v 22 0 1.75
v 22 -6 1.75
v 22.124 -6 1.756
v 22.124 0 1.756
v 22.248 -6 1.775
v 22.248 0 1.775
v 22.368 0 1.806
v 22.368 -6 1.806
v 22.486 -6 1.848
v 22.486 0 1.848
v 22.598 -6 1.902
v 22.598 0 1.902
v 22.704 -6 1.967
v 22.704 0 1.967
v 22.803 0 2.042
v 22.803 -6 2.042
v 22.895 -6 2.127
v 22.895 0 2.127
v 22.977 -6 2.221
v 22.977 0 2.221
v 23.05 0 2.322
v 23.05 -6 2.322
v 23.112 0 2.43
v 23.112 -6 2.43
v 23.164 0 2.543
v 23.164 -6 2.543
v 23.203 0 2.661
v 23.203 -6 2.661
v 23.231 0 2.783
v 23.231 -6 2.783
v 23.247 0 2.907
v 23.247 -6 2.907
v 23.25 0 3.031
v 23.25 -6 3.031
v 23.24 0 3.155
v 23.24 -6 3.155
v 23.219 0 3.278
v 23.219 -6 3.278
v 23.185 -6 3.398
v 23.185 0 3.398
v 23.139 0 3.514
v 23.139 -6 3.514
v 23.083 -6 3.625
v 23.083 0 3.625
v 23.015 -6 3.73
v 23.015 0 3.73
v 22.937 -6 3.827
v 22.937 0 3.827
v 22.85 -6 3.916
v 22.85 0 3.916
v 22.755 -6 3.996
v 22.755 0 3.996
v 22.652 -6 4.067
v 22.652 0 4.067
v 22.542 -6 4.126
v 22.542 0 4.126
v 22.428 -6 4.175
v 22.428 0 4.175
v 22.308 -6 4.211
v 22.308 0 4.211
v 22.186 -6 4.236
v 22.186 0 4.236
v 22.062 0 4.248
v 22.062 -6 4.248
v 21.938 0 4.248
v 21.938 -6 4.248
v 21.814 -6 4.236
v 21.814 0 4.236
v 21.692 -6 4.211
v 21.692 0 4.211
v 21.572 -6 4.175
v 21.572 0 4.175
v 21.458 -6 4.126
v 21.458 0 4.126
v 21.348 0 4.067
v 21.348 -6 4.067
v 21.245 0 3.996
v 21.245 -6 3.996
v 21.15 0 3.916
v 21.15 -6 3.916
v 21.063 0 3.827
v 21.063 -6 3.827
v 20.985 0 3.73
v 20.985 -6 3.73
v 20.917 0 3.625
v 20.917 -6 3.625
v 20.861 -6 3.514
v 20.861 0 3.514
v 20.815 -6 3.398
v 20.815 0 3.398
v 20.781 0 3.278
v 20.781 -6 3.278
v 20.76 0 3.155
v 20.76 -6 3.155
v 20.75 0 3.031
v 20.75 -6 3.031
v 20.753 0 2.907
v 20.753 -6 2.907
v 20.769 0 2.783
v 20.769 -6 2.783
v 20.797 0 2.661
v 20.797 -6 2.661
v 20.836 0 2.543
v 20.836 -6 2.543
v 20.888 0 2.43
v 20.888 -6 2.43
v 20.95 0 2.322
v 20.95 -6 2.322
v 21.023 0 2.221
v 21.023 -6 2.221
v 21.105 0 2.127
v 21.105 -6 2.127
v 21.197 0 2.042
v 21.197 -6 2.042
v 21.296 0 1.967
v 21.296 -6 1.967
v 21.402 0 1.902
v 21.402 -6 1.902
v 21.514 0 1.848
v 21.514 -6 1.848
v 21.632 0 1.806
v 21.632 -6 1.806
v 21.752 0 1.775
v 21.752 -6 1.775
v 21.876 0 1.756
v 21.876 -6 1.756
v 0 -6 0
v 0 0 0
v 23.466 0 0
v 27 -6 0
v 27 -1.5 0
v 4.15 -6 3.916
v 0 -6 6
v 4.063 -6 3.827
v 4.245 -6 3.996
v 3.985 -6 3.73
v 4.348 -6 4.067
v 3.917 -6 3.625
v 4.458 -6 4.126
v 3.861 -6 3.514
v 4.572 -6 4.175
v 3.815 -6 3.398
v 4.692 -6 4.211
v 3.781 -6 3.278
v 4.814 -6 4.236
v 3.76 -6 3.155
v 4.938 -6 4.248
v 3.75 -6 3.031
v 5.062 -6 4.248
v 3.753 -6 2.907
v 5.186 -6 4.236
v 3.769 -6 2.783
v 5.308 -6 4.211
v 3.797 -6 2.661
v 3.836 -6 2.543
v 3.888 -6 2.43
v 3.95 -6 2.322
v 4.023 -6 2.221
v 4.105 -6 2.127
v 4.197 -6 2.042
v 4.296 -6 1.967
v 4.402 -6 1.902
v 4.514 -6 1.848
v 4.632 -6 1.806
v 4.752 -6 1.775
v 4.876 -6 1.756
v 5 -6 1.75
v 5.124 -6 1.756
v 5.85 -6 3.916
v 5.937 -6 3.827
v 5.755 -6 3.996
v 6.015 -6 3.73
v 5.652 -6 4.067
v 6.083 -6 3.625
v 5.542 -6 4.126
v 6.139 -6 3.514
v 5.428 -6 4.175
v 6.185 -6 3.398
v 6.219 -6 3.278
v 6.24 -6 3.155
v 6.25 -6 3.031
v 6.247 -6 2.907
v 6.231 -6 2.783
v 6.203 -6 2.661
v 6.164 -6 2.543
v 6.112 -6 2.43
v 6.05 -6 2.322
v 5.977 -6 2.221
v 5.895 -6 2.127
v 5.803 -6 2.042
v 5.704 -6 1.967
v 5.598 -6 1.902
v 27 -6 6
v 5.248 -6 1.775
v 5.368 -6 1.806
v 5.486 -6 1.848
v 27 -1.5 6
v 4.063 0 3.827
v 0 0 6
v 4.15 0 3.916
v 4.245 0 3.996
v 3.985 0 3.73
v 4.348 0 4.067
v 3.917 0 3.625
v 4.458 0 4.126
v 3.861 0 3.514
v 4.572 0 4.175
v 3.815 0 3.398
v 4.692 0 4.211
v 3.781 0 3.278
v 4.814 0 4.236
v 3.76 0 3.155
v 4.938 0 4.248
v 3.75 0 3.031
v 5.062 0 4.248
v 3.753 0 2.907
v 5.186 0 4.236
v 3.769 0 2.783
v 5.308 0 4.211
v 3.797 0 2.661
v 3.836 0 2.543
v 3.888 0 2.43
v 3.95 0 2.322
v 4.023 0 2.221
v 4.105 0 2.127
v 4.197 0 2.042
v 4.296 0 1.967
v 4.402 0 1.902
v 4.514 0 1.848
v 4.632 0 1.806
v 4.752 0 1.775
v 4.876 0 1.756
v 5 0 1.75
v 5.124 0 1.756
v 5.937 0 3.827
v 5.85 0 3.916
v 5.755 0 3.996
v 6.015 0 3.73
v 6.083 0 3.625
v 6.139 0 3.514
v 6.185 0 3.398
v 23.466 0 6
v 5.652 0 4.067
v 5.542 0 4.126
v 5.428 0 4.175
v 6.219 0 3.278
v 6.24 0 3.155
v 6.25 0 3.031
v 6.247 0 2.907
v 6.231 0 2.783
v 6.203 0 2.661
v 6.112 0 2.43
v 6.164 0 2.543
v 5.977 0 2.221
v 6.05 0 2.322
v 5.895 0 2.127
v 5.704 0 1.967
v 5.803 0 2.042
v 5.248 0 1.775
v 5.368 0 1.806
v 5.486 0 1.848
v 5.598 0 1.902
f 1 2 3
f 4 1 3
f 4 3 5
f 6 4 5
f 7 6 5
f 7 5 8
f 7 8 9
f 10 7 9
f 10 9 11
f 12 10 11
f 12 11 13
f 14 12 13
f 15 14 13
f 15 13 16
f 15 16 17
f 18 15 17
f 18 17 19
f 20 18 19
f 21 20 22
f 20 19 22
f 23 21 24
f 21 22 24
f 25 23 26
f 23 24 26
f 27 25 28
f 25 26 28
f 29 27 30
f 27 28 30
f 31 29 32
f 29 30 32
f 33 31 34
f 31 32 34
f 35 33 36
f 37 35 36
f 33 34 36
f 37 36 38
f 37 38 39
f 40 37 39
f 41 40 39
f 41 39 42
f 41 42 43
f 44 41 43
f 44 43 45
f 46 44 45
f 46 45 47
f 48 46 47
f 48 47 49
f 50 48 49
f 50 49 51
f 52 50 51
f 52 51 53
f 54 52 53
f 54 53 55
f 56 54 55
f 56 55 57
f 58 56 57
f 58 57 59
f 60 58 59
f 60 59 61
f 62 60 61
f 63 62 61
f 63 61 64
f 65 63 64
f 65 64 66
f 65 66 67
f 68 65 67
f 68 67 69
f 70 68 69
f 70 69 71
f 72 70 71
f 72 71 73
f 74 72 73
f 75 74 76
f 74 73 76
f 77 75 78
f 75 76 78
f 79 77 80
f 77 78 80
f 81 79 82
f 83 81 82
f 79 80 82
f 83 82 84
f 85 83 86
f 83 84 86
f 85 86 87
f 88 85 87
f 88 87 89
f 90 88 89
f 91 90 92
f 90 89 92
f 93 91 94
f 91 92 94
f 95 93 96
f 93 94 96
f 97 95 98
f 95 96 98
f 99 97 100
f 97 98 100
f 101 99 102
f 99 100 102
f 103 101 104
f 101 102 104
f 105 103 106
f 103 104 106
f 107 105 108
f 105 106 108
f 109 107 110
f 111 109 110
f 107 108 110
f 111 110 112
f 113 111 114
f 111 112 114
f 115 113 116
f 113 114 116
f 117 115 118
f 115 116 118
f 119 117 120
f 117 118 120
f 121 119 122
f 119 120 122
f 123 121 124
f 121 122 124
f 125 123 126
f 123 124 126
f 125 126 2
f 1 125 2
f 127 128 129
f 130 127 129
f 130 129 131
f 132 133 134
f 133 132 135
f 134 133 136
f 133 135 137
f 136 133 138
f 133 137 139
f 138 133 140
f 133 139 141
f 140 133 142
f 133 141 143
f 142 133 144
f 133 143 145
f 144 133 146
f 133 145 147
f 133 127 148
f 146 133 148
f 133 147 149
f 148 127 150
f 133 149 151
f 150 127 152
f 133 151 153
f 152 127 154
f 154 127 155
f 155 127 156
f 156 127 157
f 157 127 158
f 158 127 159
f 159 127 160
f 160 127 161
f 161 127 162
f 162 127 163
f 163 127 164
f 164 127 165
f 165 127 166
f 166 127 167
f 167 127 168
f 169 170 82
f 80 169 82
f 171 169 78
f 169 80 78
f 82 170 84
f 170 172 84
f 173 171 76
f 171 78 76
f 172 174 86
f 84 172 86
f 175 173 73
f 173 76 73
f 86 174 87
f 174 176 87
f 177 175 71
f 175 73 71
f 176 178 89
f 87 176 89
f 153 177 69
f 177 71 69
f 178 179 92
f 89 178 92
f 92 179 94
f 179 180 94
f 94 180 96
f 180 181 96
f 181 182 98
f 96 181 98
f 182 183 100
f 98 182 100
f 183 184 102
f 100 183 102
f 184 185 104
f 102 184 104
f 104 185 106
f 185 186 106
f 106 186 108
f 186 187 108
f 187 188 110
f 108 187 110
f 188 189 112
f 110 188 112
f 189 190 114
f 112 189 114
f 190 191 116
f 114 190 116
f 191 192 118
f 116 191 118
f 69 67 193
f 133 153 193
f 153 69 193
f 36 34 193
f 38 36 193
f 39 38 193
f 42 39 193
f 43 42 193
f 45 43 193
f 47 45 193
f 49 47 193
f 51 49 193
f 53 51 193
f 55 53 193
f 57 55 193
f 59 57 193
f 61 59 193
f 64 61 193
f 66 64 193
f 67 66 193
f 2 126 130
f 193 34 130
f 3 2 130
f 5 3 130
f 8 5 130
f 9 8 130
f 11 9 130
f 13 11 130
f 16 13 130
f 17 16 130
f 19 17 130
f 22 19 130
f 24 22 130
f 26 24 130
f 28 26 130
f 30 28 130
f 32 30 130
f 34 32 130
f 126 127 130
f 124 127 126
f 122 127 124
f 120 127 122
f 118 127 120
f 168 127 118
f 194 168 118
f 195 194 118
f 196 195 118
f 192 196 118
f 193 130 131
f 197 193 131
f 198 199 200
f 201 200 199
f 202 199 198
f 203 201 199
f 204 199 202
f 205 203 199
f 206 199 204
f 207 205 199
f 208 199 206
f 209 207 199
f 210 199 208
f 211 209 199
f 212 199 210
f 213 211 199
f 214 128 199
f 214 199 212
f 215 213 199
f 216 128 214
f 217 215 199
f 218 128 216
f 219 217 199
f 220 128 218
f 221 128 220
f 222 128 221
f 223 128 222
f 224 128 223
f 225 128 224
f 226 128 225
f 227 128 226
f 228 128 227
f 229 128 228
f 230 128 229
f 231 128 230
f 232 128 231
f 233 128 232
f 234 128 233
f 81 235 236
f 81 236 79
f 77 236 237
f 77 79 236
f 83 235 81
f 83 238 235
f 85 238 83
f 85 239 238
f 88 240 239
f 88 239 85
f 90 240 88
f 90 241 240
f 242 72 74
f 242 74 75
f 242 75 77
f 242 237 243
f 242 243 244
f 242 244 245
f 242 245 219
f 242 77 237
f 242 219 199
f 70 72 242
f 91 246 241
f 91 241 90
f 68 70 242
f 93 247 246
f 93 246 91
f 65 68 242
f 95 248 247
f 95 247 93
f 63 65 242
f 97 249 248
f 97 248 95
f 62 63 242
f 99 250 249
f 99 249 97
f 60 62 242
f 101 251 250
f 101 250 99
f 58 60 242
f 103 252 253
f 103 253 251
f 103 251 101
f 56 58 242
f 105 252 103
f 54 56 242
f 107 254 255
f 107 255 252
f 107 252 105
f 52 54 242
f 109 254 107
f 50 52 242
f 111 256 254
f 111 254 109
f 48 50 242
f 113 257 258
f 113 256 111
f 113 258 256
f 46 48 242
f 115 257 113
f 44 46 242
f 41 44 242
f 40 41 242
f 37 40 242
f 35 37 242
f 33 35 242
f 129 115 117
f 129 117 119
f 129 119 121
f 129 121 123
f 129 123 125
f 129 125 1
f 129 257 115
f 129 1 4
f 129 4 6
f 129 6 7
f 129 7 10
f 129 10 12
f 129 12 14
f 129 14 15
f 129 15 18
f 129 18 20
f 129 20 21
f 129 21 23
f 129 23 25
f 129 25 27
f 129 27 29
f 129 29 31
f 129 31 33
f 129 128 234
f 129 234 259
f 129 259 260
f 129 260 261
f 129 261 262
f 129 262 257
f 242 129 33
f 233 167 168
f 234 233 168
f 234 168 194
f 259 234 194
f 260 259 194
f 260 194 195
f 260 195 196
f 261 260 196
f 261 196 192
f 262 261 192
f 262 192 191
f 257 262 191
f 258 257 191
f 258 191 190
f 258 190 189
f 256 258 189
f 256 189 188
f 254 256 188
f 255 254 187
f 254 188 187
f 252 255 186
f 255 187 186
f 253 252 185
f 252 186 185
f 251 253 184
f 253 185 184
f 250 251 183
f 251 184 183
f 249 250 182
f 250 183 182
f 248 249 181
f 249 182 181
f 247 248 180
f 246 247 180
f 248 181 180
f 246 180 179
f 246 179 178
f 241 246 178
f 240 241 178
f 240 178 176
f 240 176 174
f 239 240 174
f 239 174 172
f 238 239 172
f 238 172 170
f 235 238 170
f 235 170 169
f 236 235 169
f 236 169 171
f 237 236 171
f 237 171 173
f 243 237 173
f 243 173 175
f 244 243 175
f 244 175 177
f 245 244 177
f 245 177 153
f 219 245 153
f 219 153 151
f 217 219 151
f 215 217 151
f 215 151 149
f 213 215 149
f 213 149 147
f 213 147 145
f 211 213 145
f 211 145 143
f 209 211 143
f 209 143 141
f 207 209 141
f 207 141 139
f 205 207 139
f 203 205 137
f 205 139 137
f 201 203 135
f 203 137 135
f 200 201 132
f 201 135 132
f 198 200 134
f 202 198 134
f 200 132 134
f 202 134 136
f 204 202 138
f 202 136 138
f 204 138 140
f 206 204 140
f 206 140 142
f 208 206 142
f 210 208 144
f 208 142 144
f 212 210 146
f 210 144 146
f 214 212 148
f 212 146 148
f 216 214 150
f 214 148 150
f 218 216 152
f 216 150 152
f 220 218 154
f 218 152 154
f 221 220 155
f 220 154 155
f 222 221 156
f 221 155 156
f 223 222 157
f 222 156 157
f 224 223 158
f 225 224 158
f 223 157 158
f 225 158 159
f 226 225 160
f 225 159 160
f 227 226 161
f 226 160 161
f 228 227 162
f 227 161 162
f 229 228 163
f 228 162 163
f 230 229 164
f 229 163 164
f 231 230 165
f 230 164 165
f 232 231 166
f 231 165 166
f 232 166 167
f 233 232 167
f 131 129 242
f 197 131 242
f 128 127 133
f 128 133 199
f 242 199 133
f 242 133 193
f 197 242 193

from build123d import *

# Parameters (mm, degrees)
ESQUISSE1_W           = 27
ESQUISSE1_H           = 6
BOSS_EXTRU_1_DEPTH    = 6
TROU_TARAUD_M31_D     = 2.5
TROU_TARAUD_M31_DEPTH = 8.5
TROU_TARAUD_M31_TIP   = 0.751075774
CHANFREIN1_SIZE       = 1.5
CHANFREIN1_SIZE2      = 3.533778549


with BuildPart() as part:
    # Esquisse1 → Boss.-Extru.1 (new body)
    with BuildSketch(Plane.XY):
        with Locations((13.5, -3)):
            Rectangle(ESQUISSE1_W, ESQUISSE1_H)
    extrude(amount=BOSS_EXTRU_1_DEPTH)

    # Trou taraudé M31
    with Locations(Plane(origin=(5, 0, 3), x_dir=(0, 0, 1), z_dir=(0, 1, 0))):
        with Locations((0, 0), (0, 17)):
            Hole(TROU_TARAUD_M31_D / 2, depth=TROU_TARAUD_M31_DEPTH)
            with Locations((0, 0, -(TROU_TARAUD_M31_DEPTH + TROU_TARAUD_M31_TIP / 2))):  # 118° drill point
                Cone(0, TROU_TARAUD_M31_D / 2, TROU_TARAUD_M31_TIP, mode=Mode.SUBTRACT)

    # Chanfrein1
    chanfrein1_edges = [part.edges().sort_by_distance(p)[0] for p in [
        (27, 0, 3),
    ]]
    chanfrein1_side = [part.faces().sort_by_distance(p)[0] for p in [
        (27, -3, 3),
    ]]
    chamfer(chanfrein1_edges, length=CHANFREIN1_SIZE, length2=CHANFREIN1_SIZE2, reference=chanfrein1_side[0])


solid = part.part
